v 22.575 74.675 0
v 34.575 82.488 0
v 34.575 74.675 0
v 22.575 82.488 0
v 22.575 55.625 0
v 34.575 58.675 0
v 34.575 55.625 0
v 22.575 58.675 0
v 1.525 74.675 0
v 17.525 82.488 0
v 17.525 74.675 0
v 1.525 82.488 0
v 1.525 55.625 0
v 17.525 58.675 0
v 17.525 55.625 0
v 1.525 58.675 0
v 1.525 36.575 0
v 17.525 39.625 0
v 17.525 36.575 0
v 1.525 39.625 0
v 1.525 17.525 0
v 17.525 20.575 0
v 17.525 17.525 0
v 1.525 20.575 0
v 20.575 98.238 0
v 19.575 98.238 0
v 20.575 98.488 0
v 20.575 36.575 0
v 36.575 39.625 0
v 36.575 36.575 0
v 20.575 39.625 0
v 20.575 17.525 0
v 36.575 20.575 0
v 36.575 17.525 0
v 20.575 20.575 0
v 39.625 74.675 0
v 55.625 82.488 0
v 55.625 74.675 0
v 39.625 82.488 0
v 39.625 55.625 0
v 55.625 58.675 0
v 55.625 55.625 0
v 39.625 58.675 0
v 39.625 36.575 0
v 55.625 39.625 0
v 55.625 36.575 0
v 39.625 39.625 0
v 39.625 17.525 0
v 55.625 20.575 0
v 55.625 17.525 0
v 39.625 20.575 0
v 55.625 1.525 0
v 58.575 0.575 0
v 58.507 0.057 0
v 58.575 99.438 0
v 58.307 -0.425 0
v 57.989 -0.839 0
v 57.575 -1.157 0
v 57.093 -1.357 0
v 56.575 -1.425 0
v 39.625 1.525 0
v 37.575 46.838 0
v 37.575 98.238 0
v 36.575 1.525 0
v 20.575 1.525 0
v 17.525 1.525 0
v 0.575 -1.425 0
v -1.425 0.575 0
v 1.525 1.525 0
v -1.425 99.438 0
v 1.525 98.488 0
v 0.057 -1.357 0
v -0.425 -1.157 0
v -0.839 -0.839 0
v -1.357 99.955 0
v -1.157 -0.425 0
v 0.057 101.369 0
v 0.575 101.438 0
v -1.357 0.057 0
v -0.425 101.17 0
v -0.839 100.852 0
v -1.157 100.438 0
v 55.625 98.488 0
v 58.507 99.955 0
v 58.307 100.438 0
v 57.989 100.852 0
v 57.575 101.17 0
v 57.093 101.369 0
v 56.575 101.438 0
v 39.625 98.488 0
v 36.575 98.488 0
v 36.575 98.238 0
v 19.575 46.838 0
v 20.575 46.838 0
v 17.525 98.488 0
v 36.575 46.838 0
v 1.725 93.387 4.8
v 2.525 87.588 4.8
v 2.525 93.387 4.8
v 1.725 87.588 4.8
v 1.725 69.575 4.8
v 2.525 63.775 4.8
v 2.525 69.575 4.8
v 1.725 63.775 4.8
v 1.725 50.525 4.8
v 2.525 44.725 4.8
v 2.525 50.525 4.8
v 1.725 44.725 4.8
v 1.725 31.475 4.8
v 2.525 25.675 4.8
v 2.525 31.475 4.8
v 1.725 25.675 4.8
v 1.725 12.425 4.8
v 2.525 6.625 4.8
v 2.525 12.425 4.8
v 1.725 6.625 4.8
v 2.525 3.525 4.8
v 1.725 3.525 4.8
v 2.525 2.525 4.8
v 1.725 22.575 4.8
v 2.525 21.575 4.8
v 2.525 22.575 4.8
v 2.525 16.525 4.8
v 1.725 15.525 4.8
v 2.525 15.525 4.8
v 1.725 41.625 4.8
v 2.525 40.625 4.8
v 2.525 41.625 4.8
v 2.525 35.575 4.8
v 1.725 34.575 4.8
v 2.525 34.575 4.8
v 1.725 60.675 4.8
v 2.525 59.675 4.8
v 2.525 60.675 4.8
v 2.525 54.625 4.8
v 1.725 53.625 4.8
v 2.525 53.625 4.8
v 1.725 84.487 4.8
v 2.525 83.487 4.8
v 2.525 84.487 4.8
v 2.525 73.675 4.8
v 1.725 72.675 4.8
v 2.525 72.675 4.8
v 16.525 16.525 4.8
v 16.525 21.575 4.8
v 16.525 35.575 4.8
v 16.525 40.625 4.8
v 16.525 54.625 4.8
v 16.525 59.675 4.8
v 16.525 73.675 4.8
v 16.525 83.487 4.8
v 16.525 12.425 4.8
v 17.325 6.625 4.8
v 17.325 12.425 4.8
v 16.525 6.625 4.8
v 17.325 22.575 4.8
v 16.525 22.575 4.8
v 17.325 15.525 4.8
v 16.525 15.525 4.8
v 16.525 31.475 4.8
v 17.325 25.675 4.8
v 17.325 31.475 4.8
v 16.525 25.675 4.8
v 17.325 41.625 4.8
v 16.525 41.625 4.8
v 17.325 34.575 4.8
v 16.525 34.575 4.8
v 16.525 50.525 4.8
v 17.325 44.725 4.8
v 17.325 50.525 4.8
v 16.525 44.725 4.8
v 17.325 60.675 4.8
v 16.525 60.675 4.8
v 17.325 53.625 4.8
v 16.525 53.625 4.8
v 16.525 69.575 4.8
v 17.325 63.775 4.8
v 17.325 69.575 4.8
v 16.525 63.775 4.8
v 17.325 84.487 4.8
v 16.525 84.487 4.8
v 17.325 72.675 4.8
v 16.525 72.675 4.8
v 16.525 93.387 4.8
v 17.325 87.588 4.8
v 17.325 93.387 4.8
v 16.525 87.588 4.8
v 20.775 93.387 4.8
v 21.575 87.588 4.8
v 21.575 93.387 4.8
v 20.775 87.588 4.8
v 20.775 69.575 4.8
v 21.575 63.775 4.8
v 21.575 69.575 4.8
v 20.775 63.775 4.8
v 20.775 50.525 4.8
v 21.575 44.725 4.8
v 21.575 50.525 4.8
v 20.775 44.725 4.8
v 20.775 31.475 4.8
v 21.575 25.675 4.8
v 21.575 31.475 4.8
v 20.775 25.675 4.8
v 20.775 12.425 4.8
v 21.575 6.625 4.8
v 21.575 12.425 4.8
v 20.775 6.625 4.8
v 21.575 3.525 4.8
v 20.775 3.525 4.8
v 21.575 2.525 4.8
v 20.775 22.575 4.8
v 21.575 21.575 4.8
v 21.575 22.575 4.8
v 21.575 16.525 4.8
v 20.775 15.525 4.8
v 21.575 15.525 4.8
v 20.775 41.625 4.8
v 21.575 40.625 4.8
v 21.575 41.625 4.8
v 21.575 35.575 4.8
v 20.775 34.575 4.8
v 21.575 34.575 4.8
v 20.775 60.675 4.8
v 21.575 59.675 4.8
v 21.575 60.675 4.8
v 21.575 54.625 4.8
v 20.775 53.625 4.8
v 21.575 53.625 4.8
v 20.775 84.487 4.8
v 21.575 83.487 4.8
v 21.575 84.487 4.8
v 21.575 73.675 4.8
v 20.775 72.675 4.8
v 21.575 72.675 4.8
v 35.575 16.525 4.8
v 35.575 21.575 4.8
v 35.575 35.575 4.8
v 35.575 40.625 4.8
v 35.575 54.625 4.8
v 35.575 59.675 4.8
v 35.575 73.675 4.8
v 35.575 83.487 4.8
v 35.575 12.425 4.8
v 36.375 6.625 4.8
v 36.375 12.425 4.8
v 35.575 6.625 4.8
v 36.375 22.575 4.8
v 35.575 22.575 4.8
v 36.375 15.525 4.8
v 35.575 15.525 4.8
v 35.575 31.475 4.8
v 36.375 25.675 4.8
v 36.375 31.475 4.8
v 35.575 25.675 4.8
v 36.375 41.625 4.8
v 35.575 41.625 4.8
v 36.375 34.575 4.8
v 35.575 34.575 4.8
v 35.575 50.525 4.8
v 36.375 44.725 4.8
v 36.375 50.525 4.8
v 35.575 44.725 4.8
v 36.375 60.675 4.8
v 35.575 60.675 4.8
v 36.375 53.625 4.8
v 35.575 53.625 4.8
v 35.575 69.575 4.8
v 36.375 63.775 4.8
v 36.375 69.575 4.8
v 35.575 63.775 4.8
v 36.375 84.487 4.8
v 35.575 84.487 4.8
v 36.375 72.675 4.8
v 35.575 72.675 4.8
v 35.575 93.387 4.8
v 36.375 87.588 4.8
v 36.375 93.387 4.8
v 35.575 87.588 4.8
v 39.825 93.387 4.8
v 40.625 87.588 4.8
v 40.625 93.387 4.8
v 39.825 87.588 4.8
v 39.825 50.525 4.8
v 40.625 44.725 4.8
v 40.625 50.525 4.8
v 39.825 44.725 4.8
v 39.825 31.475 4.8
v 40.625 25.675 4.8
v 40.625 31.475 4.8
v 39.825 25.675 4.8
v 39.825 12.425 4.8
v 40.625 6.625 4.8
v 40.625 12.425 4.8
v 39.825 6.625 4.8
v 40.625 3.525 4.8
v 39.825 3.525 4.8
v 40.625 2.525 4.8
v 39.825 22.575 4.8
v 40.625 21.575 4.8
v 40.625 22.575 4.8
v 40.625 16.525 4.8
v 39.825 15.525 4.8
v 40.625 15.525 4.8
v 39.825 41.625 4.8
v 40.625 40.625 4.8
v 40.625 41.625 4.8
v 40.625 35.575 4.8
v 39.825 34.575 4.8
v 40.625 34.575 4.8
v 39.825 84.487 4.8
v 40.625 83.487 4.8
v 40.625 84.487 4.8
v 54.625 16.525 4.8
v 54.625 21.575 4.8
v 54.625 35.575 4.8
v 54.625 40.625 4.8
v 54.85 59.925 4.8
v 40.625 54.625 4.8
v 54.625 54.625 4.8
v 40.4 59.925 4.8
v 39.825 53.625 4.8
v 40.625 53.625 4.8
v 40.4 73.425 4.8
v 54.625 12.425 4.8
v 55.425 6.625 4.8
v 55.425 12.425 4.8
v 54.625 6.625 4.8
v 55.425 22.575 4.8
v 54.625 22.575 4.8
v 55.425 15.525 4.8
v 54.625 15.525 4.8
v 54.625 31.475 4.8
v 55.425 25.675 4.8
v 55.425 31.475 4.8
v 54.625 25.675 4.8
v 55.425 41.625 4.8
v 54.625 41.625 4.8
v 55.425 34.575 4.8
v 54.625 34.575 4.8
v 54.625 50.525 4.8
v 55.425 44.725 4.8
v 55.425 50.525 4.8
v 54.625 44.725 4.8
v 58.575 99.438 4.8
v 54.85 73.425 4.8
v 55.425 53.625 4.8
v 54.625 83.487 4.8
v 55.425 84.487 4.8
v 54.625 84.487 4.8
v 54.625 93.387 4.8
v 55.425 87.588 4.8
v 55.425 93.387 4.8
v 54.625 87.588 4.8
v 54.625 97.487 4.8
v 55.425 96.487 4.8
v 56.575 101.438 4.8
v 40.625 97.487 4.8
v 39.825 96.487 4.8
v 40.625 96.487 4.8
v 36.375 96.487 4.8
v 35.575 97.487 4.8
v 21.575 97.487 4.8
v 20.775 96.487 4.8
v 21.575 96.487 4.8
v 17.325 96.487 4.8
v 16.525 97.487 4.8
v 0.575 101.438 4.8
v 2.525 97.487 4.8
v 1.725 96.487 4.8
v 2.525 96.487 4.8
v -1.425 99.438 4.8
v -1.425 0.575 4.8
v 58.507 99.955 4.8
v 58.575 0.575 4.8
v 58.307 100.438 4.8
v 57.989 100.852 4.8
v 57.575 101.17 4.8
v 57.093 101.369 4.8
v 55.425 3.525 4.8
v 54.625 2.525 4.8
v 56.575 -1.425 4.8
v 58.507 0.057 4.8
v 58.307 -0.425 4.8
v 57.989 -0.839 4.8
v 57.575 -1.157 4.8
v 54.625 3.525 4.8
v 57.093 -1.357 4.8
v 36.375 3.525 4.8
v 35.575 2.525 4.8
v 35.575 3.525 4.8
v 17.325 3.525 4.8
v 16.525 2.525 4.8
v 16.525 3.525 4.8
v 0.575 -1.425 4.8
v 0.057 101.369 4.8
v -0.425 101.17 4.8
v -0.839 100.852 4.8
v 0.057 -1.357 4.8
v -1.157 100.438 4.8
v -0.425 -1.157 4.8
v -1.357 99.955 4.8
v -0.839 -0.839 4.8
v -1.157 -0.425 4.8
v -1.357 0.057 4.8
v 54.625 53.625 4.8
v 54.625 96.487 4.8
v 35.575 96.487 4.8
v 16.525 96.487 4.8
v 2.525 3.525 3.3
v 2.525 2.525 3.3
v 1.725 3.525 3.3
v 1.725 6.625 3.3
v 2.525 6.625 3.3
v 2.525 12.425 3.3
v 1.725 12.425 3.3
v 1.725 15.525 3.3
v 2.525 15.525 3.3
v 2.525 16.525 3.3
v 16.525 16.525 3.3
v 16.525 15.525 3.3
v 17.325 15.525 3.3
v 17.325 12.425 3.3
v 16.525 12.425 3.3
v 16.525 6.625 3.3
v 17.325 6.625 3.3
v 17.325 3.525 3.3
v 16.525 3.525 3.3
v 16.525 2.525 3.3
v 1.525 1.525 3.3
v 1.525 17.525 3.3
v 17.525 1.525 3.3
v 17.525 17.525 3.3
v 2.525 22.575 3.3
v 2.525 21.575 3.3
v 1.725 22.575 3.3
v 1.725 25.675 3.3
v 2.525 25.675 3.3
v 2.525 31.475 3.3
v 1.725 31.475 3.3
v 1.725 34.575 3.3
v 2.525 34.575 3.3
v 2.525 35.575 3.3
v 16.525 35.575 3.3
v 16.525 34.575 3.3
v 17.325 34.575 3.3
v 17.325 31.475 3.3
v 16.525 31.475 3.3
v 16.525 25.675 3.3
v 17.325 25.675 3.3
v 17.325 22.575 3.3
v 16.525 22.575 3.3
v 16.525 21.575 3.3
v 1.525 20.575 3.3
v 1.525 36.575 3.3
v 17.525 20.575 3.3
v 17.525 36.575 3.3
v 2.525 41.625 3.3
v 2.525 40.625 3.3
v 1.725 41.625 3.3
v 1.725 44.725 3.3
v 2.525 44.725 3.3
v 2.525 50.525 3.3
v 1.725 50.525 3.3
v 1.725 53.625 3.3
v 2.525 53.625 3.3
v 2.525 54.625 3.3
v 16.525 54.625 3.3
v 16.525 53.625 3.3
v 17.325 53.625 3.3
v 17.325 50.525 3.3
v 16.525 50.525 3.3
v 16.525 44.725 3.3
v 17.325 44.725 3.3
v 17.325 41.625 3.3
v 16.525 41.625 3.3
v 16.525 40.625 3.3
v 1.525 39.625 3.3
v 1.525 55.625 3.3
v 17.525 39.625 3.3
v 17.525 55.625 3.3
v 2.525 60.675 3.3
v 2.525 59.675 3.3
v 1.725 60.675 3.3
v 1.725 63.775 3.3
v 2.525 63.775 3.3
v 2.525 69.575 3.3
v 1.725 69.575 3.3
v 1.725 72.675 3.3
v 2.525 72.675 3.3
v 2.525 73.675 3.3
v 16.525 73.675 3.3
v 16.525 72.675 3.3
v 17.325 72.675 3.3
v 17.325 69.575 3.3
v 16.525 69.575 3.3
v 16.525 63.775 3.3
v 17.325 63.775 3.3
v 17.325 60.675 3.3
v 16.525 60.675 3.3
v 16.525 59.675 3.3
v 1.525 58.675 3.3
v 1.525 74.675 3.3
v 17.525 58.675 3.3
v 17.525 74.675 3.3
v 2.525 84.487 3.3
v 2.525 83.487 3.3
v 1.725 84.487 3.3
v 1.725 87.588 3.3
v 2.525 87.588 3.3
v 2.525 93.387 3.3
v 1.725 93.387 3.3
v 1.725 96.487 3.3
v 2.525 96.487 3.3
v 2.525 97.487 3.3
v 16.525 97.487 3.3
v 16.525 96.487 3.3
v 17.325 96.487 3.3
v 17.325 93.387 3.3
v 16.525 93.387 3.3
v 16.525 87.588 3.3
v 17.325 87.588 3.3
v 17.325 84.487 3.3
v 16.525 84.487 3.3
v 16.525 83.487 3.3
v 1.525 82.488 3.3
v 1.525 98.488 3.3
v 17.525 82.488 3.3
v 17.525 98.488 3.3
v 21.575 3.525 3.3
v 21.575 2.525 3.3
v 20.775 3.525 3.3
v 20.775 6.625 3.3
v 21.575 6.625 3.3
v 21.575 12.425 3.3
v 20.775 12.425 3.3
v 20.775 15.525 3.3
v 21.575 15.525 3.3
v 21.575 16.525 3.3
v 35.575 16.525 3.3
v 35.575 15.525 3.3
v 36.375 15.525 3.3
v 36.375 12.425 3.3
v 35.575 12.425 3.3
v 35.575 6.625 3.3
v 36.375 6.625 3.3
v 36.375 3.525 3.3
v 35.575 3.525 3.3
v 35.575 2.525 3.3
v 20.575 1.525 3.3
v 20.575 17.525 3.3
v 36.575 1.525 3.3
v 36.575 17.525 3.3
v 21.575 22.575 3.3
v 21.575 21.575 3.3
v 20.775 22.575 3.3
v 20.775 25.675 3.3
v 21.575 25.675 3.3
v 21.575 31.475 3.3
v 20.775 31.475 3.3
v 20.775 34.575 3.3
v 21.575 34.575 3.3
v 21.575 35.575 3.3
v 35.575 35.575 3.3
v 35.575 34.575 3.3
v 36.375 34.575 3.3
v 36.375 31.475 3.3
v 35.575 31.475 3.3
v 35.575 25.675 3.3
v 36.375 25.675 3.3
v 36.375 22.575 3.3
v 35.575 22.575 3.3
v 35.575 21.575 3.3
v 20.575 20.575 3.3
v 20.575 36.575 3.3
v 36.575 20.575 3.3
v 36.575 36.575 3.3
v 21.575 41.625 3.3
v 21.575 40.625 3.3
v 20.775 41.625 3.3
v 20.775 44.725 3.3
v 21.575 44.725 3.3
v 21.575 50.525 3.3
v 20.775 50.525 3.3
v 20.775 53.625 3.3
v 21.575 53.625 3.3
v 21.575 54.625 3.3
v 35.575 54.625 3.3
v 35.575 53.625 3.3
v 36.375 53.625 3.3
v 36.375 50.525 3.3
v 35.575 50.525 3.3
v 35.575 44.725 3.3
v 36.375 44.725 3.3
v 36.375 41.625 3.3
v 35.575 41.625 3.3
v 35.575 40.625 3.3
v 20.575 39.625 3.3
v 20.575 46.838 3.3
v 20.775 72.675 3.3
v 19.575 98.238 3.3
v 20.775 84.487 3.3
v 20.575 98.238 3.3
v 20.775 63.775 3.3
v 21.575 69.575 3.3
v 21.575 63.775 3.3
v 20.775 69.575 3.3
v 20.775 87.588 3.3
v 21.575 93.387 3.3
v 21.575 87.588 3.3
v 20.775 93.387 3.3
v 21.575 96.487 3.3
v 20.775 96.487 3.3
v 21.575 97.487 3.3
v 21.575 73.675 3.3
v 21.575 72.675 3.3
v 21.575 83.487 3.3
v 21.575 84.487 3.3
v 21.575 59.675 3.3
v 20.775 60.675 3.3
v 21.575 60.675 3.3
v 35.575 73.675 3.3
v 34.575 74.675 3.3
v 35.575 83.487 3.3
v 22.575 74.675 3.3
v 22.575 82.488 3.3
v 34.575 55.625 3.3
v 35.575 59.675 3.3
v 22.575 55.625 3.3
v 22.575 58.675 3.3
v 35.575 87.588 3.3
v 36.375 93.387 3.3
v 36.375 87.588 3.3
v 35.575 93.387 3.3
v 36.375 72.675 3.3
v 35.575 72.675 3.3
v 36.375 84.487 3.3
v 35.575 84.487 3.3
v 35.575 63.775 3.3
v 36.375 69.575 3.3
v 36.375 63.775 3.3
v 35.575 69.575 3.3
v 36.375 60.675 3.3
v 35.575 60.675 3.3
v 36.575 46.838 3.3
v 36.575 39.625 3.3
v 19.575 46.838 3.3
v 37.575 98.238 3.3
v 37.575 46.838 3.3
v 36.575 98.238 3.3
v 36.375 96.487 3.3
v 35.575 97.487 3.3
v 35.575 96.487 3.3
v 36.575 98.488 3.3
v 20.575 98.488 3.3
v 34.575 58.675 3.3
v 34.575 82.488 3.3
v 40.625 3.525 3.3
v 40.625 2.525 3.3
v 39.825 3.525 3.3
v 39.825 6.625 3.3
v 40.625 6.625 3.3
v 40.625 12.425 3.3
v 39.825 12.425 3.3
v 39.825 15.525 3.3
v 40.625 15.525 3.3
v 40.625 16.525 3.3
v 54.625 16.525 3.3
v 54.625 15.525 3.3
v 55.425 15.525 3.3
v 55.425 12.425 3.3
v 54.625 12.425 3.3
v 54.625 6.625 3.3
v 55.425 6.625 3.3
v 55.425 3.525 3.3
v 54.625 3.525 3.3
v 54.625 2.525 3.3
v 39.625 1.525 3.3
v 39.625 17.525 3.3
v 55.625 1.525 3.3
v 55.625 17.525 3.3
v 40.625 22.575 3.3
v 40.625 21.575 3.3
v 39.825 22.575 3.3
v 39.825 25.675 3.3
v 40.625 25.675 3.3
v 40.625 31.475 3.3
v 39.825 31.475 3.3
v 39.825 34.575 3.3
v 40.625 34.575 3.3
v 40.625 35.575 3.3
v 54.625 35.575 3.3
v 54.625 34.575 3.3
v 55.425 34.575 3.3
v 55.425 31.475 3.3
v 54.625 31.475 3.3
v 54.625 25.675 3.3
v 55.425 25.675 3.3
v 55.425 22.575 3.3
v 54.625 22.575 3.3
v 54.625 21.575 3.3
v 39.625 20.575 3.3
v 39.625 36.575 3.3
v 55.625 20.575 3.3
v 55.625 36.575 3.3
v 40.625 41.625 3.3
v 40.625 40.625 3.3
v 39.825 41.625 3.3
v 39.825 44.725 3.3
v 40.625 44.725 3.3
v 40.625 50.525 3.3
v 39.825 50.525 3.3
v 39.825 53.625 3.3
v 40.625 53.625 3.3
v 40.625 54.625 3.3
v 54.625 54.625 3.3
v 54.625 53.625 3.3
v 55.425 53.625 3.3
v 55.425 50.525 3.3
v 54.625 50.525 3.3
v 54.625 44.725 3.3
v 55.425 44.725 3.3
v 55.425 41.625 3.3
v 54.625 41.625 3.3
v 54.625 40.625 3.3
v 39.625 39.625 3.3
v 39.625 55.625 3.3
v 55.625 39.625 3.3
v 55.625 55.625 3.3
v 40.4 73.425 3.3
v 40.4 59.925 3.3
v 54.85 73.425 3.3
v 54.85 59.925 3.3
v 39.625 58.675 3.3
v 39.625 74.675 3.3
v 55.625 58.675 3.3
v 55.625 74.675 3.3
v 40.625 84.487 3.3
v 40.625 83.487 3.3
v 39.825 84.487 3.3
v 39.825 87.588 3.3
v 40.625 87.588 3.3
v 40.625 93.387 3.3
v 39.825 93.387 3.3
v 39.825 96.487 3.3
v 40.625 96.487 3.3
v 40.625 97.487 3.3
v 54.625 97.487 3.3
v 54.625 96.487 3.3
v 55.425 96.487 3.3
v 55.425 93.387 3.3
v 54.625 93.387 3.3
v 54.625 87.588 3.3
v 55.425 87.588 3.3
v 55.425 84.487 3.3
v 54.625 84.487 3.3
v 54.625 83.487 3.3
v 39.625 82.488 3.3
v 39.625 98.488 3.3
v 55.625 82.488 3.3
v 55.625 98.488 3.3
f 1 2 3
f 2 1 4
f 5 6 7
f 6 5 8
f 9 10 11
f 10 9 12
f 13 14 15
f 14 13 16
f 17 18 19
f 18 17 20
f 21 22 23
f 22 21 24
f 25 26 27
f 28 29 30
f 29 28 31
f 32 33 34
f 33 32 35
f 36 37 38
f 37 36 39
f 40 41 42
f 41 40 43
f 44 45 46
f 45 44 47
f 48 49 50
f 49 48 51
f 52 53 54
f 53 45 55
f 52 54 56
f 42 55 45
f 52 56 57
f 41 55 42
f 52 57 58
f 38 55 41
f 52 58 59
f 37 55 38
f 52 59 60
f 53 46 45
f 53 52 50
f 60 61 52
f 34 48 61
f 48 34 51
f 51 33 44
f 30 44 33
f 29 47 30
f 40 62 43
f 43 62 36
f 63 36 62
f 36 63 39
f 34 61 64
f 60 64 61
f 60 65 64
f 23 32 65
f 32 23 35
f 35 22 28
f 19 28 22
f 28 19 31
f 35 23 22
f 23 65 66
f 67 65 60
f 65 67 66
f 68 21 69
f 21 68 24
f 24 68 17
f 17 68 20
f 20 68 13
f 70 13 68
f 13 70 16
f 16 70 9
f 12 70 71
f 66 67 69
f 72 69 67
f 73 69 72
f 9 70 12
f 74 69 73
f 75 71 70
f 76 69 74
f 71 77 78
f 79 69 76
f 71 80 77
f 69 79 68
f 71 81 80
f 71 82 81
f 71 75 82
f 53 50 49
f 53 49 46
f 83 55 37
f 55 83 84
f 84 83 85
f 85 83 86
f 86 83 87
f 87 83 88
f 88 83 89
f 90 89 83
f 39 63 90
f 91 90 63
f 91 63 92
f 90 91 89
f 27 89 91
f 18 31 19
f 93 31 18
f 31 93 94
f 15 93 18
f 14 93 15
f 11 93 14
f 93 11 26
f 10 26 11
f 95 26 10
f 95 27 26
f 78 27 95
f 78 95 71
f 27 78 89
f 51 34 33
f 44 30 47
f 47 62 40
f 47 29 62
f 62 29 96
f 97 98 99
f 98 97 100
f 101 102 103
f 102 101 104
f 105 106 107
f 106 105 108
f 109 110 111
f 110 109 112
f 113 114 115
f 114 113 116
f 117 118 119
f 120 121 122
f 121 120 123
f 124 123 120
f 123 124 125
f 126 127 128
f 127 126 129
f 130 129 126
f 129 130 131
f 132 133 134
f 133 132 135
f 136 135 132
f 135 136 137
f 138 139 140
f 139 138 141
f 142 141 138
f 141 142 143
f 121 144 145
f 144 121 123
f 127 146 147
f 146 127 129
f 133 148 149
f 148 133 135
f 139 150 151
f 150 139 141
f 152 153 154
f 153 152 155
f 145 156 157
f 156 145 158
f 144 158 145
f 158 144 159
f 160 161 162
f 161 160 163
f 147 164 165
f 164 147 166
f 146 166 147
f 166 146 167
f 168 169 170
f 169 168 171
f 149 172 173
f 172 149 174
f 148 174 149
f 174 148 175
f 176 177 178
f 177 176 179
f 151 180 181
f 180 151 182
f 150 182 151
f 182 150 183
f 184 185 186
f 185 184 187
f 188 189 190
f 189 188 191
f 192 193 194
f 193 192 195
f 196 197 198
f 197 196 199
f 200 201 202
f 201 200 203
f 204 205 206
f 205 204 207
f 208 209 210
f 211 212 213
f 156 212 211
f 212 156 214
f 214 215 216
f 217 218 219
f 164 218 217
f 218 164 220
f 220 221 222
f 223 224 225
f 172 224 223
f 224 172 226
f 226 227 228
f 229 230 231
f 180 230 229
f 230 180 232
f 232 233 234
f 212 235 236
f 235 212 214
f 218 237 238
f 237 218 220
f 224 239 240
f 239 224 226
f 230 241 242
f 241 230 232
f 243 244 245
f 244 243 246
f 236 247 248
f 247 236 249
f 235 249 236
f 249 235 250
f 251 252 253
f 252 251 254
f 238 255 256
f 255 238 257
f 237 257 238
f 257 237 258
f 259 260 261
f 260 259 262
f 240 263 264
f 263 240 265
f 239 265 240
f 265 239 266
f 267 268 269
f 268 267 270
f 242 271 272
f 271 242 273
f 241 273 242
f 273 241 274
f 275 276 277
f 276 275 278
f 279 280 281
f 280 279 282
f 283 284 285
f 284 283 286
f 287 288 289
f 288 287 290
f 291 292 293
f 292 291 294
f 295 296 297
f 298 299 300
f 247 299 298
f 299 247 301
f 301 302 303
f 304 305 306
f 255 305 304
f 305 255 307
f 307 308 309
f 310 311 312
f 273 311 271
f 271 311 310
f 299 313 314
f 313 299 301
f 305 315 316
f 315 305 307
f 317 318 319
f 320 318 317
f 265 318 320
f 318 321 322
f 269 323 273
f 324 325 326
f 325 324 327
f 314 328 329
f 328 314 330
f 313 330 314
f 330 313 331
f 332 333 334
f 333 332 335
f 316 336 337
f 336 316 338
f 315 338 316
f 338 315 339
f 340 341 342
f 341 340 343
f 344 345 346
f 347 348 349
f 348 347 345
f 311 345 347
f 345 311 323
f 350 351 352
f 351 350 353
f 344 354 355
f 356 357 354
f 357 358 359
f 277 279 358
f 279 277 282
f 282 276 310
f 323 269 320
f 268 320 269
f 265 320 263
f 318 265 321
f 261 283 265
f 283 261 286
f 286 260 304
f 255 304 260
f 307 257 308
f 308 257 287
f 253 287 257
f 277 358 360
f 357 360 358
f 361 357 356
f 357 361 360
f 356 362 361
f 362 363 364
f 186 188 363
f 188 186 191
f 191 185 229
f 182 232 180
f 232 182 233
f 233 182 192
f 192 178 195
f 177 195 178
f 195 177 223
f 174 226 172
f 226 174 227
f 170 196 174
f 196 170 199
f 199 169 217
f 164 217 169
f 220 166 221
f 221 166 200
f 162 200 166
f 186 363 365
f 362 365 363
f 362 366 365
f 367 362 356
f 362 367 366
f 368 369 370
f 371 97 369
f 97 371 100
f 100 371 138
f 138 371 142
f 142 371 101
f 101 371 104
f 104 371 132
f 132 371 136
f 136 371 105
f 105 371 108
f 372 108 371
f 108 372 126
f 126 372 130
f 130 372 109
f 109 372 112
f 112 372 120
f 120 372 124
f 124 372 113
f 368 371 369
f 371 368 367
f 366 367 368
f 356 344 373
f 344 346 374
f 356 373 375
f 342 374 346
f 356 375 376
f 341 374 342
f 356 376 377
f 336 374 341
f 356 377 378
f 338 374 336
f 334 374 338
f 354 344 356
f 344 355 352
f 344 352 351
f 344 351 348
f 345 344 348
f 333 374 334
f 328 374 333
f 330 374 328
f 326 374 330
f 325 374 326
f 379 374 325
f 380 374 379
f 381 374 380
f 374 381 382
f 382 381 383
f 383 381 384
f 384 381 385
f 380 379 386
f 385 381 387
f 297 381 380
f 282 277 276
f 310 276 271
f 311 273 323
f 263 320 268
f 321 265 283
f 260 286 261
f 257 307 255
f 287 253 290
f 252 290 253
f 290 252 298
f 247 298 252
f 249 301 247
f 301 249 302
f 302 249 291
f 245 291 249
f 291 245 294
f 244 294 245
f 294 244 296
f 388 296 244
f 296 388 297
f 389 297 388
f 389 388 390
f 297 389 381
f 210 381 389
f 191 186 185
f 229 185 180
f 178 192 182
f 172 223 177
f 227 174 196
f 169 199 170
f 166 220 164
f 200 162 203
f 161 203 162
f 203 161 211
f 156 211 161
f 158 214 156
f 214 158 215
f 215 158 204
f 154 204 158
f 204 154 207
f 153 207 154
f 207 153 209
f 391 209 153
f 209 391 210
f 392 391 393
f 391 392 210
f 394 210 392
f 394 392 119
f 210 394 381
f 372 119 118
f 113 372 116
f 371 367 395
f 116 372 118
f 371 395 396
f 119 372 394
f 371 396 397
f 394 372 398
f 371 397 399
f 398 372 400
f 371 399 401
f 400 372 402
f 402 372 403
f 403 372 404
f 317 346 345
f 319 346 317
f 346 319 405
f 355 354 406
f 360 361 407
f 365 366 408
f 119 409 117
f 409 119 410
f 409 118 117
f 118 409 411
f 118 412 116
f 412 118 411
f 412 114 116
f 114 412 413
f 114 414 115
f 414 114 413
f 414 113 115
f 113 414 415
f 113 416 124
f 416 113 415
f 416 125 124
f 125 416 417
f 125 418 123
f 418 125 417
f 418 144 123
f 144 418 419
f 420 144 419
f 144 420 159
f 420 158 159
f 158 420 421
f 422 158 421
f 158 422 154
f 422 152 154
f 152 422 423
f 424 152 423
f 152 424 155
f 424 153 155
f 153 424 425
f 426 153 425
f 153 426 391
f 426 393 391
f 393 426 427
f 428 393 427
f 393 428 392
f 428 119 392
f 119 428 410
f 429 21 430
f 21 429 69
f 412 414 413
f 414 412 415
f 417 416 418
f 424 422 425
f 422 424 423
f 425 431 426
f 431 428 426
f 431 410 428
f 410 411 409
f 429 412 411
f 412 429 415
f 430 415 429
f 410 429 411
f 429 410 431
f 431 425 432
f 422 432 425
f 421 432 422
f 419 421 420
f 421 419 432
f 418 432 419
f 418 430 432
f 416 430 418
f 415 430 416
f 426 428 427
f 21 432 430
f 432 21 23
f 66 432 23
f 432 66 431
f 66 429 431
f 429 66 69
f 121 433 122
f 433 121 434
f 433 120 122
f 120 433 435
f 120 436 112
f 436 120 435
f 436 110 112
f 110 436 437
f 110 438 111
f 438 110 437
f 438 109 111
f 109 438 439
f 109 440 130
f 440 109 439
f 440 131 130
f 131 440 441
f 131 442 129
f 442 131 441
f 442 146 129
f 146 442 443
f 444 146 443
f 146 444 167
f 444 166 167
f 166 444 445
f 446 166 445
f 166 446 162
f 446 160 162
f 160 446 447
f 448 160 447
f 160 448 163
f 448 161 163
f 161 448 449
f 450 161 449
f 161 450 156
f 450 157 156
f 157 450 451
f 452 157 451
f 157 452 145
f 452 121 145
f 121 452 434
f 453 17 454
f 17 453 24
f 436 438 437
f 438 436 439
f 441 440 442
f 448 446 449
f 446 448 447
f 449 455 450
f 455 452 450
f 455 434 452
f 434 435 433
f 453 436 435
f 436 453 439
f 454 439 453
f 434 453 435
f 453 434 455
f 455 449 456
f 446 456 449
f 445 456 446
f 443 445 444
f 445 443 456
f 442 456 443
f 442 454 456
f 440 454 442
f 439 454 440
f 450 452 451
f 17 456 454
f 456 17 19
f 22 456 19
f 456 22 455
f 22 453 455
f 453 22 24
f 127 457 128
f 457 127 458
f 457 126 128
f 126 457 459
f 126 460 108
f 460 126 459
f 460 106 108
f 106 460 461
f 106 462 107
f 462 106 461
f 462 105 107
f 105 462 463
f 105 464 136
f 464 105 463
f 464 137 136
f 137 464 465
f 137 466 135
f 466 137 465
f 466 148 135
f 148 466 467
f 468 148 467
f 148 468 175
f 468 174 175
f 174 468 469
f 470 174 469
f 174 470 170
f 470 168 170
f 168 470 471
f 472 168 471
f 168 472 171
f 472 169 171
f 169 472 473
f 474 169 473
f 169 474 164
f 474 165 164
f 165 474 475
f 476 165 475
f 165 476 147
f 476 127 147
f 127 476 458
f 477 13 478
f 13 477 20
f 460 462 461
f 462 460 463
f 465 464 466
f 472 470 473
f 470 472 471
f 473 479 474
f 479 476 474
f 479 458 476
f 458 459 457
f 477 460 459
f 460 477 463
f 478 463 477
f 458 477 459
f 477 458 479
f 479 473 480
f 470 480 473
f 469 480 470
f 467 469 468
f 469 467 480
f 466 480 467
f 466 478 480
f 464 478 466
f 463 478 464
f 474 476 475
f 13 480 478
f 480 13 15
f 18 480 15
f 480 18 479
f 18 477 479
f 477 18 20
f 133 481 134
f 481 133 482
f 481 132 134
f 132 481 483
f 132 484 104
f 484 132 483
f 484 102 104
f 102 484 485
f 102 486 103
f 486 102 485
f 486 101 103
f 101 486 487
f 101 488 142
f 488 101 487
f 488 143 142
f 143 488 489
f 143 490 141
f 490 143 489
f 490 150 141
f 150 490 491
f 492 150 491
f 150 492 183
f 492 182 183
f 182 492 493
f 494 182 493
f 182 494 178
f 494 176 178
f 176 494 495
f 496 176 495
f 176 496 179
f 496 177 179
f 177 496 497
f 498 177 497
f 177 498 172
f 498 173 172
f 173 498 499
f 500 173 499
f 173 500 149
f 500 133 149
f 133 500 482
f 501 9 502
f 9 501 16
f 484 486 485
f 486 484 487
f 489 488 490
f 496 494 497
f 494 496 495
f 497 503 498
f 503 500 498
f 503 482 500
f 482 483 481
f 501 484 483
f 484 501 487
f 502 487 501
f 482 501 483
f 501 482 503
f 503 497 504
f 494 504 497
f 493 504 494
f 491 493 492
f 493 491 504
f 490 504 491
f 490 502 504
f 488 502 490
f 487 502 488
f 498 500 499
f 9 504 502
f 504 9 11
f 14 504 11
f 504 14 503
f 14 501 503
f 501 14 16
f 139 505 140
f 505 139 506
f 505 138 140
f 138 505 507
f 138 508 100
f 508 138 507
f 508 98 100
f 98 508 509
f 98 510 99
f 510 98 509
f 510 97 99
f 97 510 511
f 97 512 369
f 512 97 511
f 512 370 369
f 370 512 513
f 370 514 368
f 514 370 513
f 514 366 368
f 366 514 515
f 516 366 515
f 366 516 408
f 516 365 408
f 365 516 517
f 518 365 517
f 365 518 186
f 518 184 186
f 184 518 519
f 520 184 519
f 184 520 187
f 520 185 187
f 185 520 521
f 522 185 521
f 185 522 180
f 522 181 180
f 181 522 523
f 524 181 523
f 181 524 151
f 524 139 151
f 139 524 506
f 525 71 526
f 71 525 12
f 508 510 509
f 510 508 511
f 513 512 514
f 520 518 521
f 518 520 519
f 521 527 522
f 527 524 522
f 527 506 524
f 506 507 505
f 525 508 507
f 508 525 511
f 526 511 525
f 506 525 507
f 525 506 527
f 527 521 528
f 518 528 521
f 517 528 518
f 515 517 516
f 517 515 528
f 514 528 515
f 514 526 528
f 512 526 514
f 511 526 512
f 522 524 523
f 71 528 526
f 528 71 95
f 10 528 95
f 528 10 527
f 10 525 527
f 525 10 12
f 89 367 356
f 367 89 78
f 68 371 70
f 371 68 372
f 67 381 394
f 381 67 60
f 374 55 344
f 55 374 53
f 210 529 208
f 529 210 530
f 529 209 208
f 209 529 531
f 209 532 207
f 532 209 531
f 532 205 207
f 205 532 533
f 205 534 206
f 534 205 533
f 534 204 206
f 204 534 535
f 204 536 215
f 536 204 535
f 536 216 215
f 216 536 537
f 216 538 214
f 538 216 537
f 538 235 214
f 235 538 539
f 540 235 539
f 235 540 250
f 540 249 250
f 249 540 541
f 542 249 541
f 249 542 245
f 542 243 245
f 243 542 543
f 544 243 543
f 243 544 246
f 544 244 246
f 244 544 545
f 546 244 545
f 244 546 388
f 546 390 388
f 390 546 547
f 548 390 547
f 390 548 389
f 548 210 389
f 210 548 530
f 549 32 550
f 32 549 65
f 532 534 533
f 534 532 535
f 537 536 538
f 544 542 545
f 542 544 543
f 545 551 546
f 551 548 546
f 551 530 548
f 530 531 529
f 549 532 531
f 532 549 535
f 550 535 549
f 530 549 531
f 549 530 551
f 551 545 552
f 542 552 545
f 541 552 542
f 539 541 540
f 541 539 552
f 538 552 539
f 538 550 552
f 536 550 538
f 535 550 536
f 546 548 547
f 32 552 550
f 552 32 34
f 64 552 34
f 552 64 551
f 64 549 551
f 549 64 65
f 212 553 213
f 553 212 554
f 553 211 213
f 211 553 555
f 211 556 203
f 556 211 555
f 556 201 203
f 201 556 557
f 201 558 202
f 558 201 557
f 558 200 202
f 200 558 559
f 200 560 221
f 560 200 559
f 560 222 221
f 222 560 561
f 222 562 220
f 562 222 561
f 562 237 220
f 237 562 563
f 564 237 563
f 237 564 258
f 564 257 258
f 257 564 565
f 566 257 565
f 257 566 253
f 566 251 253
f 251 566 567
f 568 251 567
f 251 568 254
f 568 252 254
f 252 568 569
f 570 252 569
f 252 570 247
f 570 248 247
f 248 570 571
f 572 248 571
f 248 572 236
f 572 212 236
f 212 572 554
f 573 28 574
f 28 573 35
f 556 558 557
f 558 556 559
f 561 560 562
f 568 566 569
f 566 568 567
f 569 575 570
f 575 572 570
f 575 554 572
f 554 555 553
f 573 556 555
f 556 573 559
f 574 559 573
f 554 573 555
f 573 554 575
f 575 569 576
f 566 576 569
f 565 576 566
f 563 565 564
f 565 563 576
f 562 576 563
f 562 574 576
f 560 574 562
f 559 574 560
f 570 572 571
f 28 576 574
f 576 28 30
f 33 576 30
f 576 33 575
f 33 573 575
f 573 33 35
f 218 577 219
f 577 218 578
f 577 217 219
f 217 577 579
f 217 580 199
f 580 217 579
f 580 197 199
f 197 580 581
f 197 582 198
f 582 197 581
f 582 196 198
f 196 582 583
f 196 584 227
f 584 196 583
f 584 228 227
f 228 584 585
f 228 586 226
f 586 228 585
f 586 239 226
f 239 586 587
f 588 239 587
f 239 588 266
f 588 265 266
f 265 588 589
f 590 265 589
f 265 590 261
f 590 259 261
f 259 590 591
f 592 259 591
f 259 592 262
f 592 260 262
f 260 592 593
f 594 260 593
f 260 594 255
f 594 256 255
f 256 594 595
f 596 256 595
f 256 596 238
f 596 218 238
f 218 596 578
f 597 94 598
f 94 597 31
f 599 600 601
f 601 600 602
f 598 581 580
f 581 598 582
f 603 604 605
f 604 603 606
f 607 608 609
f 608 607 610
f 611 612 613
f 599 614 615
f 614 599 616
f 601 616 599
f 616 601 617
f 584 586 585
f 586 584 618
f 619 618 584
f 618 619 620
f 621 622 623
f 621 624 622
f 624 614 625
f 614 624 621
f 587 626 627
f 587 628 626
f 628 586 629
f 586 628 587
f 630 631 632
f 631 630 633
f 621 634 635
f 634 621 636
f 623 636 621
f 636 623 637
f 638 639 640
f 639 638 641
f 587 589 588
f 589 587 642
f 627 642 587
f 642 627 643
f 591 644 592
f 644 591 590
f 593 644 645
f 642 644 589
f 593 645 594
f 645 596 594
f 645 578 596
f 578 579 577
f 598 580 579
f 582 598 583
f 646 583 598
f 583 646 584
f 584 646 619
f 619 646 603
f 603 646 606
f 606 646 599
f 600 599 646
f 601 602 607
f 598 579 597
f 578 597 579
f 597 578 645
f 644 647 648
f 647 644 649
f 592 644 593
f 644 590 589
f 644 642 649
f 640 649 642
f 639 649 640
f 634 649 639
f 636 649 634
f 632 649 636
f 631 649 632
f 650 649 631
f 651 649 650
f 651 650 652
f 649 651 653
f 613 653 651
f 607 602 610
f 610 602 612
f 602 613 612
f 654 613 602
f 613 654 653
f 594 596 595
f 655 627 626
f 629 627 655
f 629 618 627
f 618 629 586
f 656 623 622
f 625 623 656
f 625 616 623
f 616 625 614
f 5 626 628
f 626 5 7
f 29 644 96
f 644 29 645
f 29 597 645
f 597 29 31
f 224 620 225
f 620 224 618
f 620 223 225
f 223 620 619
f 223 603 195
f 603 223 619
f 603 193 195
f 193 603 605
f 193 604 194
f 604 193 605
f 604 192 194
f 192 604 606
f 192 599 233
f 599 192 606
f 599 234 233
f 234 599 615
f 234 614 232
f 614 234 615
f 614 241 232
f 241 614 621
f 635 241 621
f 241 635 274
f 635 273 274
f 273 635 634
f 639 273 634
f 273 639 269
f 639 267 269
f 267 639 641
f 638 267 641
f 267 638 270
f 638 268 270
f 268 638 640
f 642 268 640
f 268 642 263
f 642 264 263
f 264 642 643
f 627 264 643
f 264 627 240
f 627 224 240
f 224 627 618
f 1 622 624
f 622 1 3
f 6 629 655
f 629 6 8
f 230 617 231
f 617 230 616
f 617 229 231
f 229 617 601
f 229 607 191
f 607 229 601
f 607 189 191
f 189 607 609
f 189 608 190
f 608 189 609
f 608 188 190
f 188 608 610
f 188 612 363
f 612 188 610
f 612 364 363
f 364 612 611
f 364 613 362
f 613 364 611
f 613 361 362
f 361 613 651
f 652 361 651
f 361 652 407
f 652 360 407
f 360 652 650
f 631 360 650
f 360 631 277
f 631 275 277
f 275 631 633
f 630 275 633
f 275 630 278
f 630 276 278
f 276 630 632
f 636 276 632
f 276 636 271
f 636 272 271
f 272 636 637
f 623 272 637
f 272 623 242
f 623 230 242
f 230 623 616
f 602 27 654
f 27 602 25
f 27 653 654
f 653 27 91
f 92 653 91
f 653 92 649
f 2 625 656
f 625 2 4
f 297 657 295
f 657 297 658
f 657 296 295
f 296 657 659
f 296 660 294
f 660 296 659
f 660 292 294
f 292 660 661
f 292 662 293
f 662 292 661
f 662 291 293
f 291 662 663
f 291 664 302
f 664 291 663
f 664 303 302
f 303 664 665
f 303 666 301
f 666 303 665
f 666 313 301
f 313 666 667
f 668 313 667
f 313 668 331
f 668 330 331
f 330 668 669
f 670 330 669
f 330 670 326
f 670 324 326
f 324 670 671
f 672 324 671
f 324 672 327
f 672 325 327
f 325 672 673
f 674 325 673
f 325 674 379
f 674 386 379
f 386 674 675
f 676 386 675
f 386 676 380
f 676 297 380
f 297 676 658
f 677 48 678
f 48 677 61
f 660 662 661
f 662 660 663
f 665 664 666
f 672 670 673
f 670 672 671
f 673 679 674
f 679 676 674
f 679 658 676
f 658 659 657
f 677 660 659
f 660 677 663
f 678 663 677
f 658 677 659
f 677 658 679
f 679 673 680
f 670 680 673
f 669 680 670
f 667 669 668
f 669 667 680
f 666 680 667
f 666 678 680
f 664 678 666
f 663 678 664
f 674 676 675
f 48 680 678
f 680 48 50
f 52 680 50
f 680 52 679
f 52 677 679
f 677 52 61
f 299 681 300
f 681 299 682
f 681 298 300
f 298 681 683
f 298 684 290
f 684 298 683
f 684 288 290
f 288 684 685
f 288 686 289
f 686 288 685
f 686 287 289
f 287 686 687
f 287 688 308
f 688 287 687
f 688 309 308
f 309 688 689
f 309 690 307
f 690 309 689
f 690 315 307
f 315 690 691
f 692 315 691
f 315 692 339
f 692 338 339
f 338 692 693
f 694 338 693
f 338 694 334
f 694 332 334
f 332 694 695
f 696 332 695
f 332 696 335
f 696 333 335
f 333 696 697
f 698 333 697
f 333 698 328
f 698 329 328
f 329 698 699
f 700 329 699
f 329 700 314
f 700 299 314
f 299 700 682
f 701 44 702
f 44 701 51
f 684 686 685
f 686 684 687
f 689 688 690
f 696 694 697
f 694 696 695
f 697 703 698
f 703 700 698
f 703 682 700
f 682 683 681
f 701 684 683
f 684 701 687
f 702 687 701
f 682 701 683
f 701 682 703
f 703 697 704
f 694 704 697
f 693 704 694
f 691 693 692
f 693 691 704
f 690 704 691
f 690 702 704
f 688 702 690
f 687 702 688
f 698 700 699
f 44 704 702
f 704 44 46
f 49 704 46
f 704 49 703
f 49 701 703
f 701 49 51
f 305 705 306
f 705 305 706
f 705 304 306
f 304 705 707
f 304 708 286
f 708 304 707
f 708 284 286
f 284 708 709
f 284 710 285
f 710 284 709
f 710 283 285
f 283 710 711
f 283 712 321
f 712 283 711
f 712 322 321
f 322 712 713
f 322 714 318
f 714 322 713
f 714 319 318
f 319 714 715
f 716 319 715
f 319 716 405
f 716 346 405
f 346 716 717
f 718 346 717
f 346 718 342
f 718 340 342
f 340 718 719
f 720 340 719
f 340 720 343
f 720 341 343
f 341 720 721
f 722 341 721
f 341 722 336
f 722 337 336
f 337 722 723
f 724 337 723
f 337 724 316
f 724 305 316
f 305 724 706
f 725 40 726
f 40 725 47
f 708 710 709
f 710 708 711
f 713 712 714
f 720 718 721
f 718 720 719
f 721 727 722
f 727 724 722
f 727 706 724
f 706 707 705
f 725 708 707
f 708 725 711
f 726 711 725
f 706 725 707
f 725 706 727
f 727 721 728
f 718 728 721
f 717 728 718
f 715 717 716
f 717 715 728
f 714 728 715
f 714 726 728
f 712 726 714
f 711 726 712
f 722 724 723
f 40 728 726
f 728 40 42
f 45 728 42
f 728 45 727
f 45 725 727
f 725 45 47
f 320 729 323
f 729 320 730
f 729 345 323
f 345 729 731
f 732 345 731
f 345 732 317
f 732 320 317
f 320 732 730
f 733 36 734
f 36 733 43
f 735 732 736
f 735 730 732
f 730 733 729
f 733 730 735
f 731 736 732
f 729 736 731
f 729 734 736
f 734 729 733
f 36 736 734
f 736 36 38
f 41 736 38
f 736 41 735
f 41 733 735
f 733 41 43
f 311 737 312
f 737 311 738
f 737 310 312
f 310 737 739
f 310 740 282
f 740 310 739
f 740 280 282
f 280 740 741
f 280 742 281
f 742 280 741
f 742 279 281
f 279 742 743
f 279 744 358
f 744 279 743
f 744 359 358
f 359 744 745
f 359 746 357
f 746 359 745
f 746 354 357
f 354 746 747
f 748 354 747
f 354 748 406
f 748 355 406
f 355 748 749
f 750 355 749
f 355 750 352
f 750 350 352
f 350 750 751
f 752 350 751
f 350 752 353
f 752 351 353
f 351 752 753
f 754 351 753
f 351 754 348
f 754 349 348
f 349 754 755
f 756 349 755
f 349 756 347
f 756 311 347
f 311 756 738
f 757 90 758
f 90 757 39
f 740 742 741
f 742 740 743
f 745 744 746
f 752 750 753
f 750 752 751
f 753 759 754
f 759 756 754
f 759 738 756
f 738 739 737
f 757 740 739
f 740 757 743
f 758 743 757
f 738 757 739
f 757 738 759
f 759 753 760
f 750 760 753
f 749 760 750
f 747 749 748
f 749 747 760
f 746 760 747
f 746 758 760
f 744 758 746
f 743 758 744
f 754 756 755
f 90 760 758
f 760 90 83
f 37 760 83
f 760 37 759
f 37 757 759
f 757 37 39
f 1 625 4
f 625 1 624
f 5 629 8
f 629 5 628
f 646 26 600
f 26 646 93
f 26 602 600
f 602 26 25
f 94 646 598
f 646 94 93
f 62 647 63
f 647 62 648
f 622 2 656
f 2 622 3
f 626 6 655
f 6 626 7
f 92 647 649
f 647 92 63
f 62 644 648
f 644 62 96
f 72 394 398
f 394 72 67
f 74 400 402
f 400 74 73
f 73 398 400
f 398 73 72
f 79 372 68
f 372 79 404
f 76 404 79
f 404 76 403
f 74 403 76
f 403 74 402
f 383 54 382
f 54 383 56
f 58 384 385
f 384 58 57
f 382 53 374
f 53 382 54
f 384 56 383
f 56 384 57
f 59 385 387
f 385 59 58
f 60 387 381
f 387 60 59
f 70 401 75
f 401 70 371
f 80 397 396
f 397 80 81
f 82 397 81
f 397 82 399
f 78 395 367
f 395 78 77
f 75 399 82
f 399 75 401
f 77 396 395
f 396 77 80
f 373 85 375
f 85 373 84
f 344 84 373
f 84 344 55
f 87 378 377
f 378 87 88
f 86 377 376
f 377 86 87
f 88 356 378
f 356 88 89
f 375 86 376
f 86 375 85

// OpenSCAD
$fn=24;

plate_thick=5 - 0.2;
plate_thin=1.5;

//pitch
key_unit=19.050;

overall_width=60;
overall_length=102.8625;

//array of positions
//0 = blank panel
//1 = keyswitch
//2 = encoder knob.
// Encoders can be in columns 1 and 3, but each row 1-4 can only have one at a time (per row).
// One exception: encoder cannot go in row 5 column 3.
//3 = fader. Can be anywhere in row 1
//4 = OLED. Goes in row 5, column 2+3.
//5 = empty. Tenporary solution
layout_matrix = [
 //row 1.
 [1,1,1],
 //row 2
 [1,1,1],
 //row 3
 [1,1,1],
 //row 4
 [1,1,2],
 //separator
 [0,0,0],
 //row 5 (top section)
 [1,1,1],
 ];

x_center = (key_unit*len(layout_matrix[0])-overall_width)/2;
y_center = (key_unit*(len(layout_matrix)-3/4)-overall_length)/2;

main();

// j = y
// i = x
module main(){
 intersection(){
 difference(){
 union(){
  for ( i=[0:len(layout_matrix[0])-1]) {
   for ( j=[0:len(layout_matrix)-1]) {
    if(j<4){
     translate([i*key_unit,j*key_unit,0])
     // middle
     if(i==1){
      if(j>0){
       if(layout_matrix[0][i]==3){
        plate_gen(5);
       }
       else plate_gen(layout_matrix[j][i]);
       }
       else if(layout_matrix[j][i]==2){
        plate_gen(0);
       }
      else plate_gen(layout_matrix[j][i]);
     }
     else if(j==0){
      if(layout_matrix[j][i]==2){
       plate_gen(layout_matrix[j][i]);
      }
     else if (i==1) plate_gen(0);
     else plate_gen(layout_matrix[j][i]);
     }
     else if(layout_matrix[0][i]==3){
      plate_gen(5);
     }
     else if(layout_matrix[0][i]!=3){
      plate_gen(layout_matrix[j][i]);
     }
    }
    // separator
    else if(j==4){
     if(i==0){
     translate([i*key_unit,j*key_unit,0]) separator();
     }
    }
    // top row
    else if(j>4){
     translate([i*key_unit,j*key_unit-key_unit*3/4,0])
     plate_gen(layout_matrix[j][i]);
    }
    bezel();
    }
   }
  } // end union
  pin_cut();
  }
  fillet();
 } // end intersection 
}

//outer bezel
module bezel(){
 linear_extrude(plate_thick) difference(){
 translate([x_center,y_center,0])
 square([overall_width,overall_length]);
 translate([+0.1,+0.1,0]) square([key_unit*len(layout_matrix[0])-0.2,key_unit*len(layout_matrix)-key_unit*3/4-0.2]);
 }
}

//chooses correct plate
module plate_gen(plate=0){
 if(plate==0){
  blank_plate();
 }
 else if(plate==1){
  keyswitch_plate();
 }
 else if(plate==2){
  encoder_plate();
 }
 else if(plate==3){
  fader_plate();
 }
 else if(plate==4){
  OLED_plate();
 }
 else if(plate==5){
 }
 else{blank_plate();
 }
}

module blank_plate(){
  linear_extrude(plate_thick){
 square(key_unit);
 }
}

module keyswitch_plate(){
 difference(){
  linear_extrude(plate_thick) difference(){
   translate([-0.1,-0.1,0]) square(key_unit+0.2);
   union(){
    translate([(key_unit-14)/2,(key_unit-14)/2]) square(14);
    translate([(key_unit-15.6)/2,(key_unit-3.1)/2-(5.8+3.1)/2]) square([15.6,3.1]);
    translate([(key_unit-15.6)/2,(key_unit-3.1)/2+(5.8+3.1)/2]) square([15.6,3.1]);
   }
  }
  translate([(key_unit-16)/2,(key_unit-16)/2,0]){linear_extrude(plate_thick-plate_thin){
   square(16);
   }
  }
 }
}

module encoder_plate(){
 difference() {
  linear_extrude(plate_thick) difference(){
   translate([-0.1,-0.1,0]) square(key_unit+0.2);
   translate([(key_unit-14.45)/2,(key_unit-13.5)/2,0]){
   square([14.45,13.5]);
   }
  }
  translate([(key_unit-16)/2,(key_unit-16)/2,0]){
   linear_extrude(plate_thick-plate_thin){
   square(16);
   }
  }
 }
}

module OLED_plate(){
 //2x1 part. Origin in middle column, last row.
 difference() {
 linear_extrude(plate_thick)
 difference(){
 color([.3,.6,.6])
 square([key_unit*2,key_unit]);
 color([1,0,0])
//  translate([0,(key_unit-(12.15+0.4))/2,0])
//  square([38+0.2,12.15+0.4]);
 translate([key_unit*2-3.1,(key_unit-(12.15+0.4))/2,0])
 square([3.5,12.15+0.4]);
 }
 translate([key_unit*2-26,(key_unit-(12.15+0.4))/2,plate_thick-1.6])
 cube([26,12.15+0.4,1.65]);
 }
}

module fader_plate(){
 linear_extrude(plate_thick)
 difference(){
  square([key_unit+0.2,key_unit*4]);
  translate([(key_unit-10)/2,(key_unit*4-75.1 + 0.35)/2,0]){
  square([10,75.1 + 0.35]);
  }
 }
}

module separator(){
 cube([3*key_unit,1/4*key_unit,plate_thick]);
}

//Pin headers
module pin_cut(){
 translate([x_center+21,y_center+overall_length-53-1.6,-0.1]) cube([3,53-1.6,plate_thick-plate_thin+0.1]);
 translate([x_center+overall_width-21-3,y_center+overall_length-53-1.6,-0.1]) cube([3,53-1.6,plate_thick-plate_thin+0.1]);
}

module fillet(){
 fillet_radius = 2;
 union(){
  // Full X
  translate([x_center,y_center+fillet_radius,0])
  cube([overall_width,overall_length-fillet_radius*2,plate_thick]);
  // Full Y
  translate([x_center+fillet_radius,y_center,0])
  cube([overall_width-fillet_radius*2,overall_length,plate_thick]);
  translate([x_center+fillet_radius,y_center+fillet_radius,plate_thick/2])
   cylinder(r=fillet_radius, h=plate_thick, center=true); // bottom left
  
  translate([x_center-fillet_radius+overall_width,y_center+fillet_radius,plate_thick/2])
   cylinder(r=fillet_radius, h=plate_thick, center=true); // bottom right
  
  translate([x_center+fillet_radius,y_center+overall_length-fillet_radius,plate_thick/2])
   cylinder(r=fillet_radius, h=plate_thick, center=true); // top left
  
  translate([x_center-fillet_radius+overall_width,y_center+overall_length-fillet_radius,plate_thick/2])
   cylinder(r=fillet_radius, h=plate_thick, center=true); // top right
  
 }
}
